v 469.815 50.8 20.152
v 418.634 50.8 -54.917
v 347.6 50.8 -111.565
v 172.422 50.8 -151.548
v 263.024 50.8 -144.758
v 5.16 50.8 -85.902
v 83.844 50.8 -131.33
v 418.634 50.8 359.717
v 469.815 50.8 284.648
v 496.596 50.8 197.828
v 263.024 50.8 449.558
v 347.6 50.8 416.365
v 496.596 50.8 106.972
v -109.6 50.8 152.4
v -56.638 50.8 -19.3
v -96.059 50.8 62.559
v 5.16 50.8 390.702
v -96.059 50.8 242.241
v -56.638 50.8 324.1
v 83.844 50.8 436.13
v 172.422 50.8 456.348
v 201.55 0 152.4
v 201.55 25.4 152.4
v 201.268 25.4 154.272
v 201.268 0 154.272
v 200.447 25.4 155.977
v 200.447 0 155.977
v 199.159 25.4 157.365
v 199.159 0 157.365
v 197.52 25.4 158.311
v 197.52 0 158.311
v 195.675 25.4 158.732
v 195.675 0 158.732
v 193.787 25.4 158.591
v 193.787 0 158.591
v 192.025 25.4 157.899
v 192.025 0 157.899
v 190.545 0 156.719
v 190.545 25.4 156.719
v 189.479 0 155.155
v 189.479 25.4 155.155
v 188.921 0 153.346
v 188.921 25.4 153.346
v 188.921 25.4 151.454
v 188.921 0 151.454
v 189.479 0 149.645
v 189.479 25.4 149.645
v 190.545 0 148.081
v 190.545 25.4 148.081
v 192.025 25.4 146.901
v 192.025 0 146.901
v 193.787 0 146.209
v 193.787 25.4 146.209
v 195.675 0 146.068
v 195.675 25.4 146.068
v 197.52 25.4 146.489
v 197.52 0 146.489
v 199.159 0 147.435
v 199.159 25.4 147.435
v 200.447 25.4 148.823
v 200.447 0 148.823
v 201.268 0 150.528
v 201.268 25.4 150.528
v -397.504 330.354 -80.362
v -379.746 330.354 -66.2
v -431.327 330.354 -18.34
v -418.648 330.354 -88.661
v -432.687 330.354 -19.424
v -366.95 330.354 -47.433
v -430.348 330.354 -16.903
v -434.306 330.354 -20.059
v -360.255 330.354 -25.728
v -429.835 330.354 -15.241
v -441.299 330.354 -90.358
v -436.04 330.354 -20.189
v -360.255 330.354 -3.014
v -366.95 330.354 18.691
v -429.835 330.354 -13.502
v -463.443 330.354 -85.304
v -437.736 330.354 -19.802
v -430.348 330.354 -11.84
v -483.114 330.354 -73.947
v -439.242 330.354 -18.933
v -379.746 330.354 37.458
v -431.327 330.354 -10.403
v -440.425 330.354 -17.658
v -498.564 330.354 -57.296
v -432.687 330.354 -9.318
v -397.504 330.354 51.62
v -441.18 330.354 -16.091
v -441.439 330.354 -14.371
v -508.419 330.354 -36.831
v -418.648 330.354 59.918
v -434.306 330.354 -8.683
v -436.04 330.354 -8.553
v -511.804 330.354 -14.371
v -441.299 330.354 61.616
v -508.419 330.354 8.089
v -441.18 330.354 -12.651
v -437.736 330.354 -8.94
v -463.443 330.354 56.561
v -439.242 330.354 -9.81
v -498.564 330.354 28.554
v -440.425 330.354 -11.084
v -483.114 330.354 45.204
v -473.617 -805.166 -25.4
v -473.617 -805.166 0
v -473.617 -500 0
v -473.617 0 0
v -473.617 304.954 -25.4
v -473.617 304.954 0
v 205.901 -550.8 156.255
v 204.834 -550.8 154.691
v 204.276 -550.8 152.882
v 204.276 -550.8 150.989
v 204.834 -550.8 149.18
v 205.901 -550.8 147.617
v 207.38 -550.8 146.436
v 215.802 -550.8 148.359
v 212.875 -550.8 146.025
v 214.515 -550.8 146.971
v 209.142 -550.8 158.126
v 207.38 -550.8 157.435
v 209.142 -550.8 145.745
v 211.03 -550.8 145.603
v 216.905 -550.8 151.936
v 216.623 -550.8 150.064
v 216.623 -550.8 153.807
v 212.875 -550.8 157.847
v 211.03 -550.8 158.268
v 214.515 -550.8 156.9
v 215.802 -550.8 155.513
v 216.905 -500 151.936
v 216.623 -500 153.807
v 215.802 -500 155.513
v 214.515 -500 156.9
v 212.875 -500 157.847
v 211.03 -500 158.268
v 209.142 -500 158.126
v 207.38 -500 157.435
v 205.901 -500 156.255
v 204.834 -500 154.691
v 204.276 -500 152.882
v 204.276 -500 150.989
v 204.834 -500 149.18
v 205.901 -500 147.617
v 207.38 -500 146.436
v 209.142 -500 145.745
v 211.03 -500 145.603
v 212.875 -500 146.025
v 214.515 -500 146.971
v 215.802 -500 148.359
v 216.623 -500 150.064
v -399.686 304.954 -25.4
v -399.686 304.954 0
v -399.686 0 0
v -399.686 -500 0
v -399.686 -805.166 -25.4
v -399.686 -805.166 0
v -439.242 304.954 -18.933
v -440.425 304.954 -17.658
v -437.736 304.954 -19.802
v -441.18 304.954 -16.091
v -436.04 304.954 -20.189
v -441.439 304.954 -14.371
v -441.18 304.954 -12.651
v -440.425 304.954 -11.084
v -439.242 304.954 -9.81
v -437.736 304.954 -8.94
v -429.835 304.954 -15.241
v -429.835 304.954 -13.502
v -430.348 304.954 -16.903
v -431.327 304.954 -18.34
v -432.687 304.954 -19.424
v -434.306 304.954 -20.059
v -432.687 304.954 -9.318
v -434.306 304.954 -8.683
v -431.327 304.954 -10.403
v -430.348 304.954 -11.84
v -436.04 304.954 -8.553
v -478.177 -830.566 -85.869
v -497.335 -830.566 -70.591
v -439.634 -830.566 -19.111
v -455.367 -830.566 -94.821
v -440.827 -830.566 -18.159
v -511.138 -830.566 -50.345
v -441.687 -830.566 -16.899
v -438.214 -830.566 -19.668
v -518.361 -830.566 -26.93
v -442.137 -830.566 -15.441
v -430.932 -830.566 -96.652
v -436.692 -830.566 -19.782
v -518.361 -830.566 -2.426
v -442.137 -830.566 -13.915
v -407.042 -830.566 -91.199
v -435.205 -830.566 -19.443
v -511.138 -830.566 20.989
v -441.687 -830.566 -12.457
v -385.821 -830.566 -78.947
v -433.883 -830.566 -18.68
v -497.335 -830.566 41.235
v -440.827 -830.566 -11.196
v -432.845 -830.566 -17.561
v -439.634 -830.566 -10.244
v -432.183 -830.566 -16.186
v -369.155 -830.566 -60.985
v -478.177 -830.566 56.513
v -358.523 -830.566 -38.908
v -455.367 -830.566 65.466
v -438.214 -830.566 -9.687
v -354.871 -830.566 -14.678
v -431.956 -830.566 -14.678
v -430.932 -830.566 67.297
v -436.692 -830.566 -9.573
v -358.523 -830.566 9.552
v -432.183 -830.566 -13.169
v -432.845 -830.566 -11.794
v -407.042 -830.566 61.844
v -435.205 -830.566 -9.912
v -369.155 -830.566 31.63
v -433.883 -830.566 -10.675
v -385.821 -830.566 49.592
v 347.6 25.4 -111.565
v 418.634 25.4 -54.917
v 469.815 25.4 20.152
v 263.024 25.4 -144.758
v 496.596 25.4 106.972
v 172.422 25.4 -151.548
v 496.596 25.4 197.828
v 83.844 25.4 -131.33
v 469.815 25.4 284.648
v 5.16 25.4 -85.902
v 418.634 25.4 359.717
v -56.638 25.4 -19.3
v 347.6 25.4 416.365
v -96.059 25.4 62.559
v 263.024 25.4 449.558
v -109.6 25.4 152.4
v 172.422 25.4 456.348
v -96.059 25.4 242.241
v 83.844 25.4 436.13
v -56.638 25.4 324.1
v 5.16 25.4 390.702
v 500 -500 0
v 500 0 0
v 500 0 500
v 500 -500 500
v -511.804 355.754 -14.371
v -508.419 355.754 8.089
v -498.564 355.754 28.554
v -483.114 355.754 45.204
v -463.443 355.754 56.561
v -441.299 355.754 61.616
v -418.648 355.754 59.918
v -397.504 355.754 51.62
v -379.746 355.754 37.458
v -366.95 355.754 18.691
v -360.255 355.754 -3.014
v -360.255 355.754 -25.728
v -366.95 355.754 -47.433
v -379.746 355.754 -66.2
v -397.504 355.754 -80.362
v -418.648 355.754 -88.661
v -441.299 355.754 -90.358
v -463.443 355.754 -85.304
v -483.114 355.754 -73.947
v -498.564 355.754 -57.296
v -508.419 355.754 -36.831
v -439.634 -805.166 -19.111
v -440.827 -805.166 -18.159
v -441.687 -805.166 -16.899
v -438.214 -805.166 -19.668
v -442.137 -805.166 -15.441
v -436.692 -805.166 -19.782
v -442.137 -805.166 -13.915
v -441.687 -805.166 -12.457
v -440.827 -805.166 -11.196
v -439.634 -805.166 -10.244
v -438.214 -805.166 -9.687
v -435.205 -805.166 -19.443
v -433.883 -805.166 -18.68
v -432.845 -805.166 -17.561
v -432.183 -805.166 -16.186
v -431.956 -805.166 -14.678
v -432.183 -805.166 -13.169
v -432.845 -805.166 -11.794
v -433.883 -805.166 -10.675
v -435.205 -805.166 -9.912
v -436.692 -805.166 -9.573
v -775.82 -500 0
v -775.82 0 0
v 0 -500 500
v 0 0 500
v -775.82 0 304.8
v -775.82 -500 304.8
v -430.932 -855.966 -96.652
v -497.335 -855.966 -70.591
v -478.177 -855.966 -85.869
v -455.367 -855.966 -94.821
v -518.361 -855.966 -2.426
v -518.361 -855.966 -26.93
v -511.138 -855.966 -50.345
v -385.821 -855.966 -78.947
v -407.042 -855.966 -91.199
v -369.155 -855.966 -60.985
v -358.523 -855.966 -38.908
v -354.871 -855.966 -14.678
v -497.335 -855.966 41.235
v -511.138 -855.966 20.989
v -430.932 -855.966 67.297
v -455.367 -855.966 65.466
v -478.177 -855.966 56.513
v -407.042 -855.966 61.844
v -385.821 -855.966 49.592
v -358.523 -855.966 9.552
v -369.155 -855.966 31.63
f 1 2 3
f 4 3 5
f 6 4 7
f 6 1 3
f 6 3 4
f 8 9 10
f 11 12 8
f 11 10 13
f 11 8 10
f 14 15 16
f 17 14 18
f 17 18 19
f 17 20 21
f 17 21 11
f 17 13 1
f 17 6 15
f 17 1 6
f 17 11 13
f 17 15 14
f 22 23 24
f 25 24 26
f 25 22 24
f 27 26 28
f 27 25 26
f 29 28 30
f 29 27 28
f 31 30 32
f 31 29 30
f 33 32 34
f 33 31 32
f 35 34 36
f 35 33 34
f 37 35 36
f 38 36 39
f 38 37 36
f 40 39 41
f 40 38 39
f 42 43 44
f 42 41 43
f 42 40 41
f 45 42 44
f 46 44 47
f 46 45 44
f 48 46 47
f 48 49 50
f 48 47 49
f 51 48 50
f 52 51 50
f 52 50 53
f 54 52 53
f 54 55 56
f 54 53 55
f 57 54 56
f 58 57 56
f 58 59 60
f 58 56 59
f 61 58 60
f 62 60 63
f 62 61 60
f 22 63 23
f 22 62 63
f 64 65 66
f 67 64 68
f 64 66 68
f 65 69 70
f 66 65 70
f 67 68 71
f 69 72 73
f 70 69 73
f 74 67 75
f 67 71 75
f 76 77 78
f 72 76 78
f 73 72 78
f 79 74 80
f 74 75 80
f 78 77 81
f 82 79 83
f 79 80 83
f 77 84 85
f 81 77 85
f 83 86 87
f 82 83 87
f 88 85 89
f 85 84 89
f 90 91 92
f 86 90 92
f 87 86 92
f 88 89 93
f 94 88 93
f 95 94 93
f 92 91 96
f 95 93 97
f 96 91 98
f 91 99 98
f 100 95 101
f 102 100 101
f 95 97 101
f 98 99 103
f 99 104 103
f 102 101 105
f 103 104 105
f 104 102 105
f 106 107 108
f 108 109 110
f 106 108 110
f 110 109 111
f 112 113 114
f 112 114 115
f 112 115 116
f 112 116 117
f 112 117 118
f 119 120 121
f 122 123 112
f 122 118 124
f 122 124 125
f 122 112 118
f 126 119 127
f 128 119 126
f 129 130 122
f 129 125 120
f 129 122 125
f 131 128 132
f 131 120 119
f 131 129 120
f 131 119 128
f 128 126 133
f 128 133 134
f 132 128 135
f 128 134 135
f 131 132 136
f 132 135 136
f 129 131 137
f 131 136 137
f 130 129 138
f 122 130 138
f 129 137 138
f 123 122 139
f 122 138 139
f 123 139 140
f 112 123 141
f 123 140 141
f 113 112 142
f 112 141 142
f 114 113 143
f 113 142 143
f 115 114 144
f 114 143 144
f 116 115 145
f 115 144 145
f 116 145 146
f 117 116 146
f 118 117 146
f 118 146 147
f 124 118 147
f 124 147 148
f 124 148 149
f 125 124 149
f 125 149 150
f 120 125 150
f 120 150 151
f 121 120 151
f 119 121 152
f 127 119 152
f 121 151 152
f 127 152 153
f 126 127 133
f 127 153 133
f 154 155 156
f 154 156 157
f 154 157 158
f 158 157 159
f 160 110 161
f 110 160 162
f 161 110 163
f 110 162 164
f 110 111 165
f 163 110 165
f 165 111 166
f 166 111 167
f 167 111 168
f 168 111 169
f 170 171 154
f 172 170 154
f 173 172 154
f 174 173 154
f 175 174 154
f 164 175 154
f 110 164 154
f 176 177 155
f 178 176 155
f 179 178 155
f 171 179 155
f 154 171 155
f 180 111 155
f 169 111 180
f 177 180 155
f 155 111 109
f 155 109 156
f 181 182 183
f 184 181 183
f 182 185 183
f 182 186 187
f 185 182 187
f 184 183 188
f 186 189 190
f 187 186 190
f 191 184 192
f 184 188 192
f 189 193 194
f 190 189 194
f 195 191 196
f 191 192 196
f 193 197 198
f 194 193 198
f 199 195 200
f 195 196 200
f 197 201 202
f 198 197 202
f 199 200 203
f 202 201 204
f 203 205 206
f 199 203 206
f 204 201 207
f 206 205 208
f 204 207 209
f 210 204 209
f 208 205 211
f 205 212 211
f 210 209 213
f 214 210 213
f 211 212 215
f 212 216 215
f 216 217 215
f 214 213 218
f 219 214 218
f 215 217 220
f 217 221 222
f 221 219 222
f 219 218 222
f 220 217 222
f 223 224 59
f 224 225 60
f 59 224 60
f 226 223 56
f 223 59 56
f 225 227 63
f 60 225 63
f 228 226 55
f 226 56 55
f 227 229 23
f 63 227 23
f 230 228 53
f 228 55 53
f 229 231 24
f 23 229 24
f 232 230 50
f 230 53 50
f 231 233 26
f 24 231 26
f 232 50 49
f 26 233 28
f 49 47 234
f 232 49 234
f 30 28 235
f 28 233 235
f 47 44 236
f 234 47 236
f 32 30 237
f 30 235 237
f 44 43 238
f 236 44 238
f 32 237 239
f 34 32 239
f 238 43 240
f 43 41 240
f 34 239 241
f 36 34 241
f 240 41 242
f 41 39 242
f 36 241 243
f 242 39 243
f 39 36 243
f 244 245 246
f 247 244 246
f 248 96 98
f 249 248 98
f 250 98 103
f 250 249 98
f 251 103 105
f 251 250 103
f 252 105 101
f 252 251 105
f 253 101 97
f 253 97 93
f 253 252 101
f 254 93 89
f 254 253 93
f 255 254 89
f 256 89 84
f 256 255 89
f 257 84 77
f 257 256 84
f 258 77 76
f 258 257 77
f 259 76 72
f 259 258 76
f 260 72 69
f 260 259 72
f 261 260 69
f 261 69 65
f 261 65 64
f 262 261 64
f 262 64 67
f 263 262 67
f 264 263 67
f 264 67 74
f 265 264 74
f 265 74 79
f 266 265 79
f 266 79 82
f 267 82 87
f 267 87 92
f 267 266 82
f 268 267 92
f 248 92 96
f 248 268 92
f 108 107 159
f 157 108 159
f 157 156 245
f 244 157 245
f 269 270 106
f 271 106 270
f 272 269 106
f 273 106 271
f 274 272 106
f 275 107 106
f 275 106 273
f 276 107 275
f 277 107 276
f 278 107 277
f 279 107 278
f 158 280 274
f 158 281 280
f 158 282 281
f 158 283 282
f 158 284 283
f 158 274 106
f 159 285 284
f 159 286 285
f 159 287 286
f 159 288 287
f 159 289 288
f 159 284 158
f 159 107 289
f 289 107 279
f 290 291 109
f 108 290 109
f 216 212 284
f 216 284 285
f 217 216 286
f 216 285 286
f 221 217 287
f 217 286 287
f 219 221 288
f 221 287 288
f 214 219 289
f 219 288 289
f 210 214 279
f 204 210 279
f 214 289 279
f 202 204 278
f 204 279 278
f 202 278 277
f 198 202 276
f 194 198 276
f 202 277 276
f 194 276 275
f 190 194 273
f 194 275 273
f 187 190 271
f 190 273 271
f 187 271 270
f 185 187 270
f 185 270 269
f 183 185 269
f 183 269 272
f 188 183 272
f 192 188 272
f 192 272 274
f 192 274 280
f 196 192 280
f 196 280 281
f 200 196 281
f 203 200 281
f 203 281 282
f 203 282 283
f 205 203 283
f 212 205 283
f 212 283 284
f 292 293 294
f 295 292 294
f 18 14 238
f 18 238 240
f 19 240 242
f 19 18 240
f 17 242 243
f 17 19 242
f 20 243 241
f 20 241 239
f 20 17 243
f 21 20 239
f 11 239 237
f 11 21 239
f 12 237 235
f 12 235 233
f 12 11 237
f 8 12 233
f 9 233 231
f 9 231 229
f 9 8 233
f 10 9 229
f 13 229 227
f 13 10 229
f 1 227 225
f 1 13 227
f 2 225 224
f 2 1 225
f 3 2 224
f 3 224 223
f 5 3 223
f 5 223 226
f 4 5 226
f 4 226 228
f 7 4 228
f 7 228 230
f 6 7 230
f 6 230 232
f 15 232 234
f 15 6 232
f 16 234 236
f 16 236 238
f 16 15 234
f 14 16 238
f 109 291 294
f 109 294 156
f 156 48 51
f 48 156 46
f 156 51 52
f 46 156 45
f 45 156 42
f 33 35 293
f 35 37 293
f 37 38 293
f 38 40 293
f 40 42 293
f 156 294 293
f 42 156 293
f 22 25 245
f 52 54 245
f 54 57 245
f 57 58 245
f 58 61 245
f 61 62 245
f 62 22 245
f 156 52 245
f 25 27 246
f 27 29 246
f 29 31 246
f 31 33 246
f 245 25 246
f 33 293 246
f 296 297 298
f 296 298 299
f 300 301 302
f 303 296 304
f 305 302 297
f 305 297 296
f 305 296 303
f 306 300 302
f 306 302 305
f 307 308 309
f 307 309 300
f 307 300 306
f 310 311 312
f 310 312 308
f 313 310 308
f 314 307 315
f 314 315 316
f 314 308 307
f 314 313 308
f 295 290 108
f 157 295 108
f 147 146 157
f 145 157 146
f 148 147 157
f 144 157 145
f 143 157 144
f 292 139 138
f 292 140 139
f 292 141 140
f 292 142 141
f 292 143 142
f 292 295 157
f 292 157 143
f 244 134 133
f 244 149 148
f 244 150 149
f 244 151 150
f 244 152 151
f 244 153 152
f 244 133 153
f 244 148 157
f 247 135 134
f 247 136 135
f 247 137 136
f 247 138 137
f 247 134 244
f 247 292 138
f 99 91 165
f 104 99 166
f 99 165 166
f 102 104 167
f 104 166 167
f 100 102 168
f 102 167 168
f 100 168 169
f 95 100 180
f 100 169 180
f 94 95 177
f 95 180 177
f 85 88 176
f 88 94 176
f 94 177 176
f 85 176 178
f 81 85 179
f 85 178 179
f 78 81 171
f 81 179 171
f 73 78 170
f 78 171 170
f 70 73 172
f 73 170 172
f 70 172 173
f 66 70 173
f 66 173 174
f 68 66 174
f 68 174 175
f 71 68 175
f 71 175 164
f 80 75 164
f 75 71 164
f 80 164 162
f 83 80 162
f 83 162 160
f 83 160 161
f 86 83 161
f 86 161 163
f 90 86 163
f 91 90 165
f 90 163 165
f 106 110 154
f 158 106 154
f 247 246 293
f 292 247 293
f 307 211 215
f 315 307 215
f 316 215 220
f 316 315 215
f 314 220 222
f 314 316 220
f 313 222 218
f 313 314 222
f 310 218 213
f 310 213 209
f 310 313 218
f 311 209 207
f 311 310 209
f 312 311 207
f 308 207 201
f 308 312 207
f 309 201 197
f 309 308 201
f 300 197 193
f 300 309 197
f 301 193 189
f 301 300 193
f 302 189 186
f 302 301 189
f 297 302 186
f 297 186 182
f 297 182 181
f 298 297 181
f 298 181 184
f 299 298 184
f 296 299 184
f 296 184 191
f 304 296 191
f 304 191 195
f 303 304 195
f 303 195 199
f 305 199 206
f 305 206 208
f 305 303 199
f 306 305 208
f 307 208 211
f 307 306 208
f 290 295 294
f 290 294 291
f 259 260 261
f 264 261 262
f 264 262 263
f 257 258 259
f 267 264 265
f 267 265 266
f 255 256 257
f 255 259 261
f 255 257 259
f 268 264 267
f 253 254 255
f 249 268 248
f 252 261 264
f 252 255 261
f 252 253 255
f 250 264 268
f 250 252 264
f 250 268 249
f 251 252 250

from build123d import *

# Parameters (mm, degrees)
F1_DEPTH  = 500
F2_W      = 73.9309489727
F2_H      = 500
F2_H_2    = 305.1662445068
F2_H_3    = 304.9542307854
F3_DEPTH  = 25.4
F4_R      = 5.11898469
F5_DEPTH  = 50.8
F6_R      = 82.2041903744
F6_R_2    = 5.11898469
F7_DEPTH  = 25.4
F8_R      = 5.8344538593
F9_DEPTH  = 50.8
F10_R     = 76.2
F11_DEPTH = 25.4
F12_R     = 6.35
F13_DEPTH = 50.8
F14_R     = 304.8
F14_R_2   = 6.35
F15_DEPTH = 25.4
F16_R     = 6.35
F17_DEPTH = 50.8


with BuildPart() as f1:
    # F0 (on Front) → F1 (new body)
    with BuildSketch(Plane.XZ):
        Polygon((-775.8201853523, 304.8), (-775.8201853523, 0), (500, 0), (500, 500), (0, 500), align=None)
    extrude(amount=F1_DEPTH)

    # F2 (on face) → F3 (join)
    with BuildSketch(Plane(origin=(0, 0, 0), x_dir=(1, 0, 0), z_dir=(0, 0, -1))):
        with Locations((-436.6519004107, 250)):
            Rectangle(F2_W, F2_H)
        with Locations((-436.6519004107, 652.5831222534)):
            Rectangle(F2_W, F2_H_2)
        with Locations((-436.6519004107, -152.4771153927)):
            Rectangle(F2_W, F2_H_3)
    extrude(amount=F3_DEPTH)

    # F4 (on face) → F5 (join)
    with BuildSketch(Plane.XZ.offset(805.1662445068)):
        with Locations((-437.0749592781, -14.6776270121)):
            Circle(F4_R)
    extrude(amount=F5_DEPTH)

    # F6 (on face) → F7 (join)
    with BuildSketch(Plane.XZ.offset(855.9662445068)):
        with Locations((-437.0749592781, -14.6776270121)):
            Circle(F6_R)
        with Locations((-437.0749592781, -14.6776270121)):
            Circle(F6_R_2, mode=Mode.SUBTRACT)
    extrude(amount=-F7_DEPTH)

    # F8 (on face) → F9 (join)
    with BuildSketch(Plane(origin=(0, 304.9542307854, 0), x_dir=(-1, 0, 0), z_dir=(0, 1, 0))):
        with Locations((435.6042742729, -14.3710989505)):
            Circle(F8_R)
    extrude(amount=F9_DEPTH)

    # F10 (on face) → F11 (join)
    with BuildSketch(Plane(origin=(0, 355.7542307854, 0), x_dir=(-1, 0, 0), z_dir=(0, 1, 0))):
        with Locations((435.6042742729, -14.3710989505)):
            Circle(F10_R)
    extrude(amount=-F11_DEPTH)

    # F12 (on face) → F13 (join)
    with BuildSketch(Plane.XZ):
        with Locations((195.2, 152.4)):
            Circle(F12_R)
    extrude(amount=-F13_DEPTH)

    # F14 (on face) → F15 (join)
    with BuildSketch(Plane(origin=(0, 50.8, 0), x_dir=(-1, 0, 0), z_dir=(0, 1, 0))):
        with Locations((-195.2, 152.4)):
            Circle(F14_R)
        with Locations((-195.2, 152.4)):
            Circle(F14_R_2, mode=Mode.SUBTRACT)
    extrude(amount=-F15_DEPTH)

    # F16 (on face) → F17 (join)
    with BuildSketch(Plane.XZ.offset(500)):
        with Locations((210.5554491282, 151.9356071949)):
            Circle(F16_R)
    extrude(amount=F17_DEPTH)


solid = f1.part
